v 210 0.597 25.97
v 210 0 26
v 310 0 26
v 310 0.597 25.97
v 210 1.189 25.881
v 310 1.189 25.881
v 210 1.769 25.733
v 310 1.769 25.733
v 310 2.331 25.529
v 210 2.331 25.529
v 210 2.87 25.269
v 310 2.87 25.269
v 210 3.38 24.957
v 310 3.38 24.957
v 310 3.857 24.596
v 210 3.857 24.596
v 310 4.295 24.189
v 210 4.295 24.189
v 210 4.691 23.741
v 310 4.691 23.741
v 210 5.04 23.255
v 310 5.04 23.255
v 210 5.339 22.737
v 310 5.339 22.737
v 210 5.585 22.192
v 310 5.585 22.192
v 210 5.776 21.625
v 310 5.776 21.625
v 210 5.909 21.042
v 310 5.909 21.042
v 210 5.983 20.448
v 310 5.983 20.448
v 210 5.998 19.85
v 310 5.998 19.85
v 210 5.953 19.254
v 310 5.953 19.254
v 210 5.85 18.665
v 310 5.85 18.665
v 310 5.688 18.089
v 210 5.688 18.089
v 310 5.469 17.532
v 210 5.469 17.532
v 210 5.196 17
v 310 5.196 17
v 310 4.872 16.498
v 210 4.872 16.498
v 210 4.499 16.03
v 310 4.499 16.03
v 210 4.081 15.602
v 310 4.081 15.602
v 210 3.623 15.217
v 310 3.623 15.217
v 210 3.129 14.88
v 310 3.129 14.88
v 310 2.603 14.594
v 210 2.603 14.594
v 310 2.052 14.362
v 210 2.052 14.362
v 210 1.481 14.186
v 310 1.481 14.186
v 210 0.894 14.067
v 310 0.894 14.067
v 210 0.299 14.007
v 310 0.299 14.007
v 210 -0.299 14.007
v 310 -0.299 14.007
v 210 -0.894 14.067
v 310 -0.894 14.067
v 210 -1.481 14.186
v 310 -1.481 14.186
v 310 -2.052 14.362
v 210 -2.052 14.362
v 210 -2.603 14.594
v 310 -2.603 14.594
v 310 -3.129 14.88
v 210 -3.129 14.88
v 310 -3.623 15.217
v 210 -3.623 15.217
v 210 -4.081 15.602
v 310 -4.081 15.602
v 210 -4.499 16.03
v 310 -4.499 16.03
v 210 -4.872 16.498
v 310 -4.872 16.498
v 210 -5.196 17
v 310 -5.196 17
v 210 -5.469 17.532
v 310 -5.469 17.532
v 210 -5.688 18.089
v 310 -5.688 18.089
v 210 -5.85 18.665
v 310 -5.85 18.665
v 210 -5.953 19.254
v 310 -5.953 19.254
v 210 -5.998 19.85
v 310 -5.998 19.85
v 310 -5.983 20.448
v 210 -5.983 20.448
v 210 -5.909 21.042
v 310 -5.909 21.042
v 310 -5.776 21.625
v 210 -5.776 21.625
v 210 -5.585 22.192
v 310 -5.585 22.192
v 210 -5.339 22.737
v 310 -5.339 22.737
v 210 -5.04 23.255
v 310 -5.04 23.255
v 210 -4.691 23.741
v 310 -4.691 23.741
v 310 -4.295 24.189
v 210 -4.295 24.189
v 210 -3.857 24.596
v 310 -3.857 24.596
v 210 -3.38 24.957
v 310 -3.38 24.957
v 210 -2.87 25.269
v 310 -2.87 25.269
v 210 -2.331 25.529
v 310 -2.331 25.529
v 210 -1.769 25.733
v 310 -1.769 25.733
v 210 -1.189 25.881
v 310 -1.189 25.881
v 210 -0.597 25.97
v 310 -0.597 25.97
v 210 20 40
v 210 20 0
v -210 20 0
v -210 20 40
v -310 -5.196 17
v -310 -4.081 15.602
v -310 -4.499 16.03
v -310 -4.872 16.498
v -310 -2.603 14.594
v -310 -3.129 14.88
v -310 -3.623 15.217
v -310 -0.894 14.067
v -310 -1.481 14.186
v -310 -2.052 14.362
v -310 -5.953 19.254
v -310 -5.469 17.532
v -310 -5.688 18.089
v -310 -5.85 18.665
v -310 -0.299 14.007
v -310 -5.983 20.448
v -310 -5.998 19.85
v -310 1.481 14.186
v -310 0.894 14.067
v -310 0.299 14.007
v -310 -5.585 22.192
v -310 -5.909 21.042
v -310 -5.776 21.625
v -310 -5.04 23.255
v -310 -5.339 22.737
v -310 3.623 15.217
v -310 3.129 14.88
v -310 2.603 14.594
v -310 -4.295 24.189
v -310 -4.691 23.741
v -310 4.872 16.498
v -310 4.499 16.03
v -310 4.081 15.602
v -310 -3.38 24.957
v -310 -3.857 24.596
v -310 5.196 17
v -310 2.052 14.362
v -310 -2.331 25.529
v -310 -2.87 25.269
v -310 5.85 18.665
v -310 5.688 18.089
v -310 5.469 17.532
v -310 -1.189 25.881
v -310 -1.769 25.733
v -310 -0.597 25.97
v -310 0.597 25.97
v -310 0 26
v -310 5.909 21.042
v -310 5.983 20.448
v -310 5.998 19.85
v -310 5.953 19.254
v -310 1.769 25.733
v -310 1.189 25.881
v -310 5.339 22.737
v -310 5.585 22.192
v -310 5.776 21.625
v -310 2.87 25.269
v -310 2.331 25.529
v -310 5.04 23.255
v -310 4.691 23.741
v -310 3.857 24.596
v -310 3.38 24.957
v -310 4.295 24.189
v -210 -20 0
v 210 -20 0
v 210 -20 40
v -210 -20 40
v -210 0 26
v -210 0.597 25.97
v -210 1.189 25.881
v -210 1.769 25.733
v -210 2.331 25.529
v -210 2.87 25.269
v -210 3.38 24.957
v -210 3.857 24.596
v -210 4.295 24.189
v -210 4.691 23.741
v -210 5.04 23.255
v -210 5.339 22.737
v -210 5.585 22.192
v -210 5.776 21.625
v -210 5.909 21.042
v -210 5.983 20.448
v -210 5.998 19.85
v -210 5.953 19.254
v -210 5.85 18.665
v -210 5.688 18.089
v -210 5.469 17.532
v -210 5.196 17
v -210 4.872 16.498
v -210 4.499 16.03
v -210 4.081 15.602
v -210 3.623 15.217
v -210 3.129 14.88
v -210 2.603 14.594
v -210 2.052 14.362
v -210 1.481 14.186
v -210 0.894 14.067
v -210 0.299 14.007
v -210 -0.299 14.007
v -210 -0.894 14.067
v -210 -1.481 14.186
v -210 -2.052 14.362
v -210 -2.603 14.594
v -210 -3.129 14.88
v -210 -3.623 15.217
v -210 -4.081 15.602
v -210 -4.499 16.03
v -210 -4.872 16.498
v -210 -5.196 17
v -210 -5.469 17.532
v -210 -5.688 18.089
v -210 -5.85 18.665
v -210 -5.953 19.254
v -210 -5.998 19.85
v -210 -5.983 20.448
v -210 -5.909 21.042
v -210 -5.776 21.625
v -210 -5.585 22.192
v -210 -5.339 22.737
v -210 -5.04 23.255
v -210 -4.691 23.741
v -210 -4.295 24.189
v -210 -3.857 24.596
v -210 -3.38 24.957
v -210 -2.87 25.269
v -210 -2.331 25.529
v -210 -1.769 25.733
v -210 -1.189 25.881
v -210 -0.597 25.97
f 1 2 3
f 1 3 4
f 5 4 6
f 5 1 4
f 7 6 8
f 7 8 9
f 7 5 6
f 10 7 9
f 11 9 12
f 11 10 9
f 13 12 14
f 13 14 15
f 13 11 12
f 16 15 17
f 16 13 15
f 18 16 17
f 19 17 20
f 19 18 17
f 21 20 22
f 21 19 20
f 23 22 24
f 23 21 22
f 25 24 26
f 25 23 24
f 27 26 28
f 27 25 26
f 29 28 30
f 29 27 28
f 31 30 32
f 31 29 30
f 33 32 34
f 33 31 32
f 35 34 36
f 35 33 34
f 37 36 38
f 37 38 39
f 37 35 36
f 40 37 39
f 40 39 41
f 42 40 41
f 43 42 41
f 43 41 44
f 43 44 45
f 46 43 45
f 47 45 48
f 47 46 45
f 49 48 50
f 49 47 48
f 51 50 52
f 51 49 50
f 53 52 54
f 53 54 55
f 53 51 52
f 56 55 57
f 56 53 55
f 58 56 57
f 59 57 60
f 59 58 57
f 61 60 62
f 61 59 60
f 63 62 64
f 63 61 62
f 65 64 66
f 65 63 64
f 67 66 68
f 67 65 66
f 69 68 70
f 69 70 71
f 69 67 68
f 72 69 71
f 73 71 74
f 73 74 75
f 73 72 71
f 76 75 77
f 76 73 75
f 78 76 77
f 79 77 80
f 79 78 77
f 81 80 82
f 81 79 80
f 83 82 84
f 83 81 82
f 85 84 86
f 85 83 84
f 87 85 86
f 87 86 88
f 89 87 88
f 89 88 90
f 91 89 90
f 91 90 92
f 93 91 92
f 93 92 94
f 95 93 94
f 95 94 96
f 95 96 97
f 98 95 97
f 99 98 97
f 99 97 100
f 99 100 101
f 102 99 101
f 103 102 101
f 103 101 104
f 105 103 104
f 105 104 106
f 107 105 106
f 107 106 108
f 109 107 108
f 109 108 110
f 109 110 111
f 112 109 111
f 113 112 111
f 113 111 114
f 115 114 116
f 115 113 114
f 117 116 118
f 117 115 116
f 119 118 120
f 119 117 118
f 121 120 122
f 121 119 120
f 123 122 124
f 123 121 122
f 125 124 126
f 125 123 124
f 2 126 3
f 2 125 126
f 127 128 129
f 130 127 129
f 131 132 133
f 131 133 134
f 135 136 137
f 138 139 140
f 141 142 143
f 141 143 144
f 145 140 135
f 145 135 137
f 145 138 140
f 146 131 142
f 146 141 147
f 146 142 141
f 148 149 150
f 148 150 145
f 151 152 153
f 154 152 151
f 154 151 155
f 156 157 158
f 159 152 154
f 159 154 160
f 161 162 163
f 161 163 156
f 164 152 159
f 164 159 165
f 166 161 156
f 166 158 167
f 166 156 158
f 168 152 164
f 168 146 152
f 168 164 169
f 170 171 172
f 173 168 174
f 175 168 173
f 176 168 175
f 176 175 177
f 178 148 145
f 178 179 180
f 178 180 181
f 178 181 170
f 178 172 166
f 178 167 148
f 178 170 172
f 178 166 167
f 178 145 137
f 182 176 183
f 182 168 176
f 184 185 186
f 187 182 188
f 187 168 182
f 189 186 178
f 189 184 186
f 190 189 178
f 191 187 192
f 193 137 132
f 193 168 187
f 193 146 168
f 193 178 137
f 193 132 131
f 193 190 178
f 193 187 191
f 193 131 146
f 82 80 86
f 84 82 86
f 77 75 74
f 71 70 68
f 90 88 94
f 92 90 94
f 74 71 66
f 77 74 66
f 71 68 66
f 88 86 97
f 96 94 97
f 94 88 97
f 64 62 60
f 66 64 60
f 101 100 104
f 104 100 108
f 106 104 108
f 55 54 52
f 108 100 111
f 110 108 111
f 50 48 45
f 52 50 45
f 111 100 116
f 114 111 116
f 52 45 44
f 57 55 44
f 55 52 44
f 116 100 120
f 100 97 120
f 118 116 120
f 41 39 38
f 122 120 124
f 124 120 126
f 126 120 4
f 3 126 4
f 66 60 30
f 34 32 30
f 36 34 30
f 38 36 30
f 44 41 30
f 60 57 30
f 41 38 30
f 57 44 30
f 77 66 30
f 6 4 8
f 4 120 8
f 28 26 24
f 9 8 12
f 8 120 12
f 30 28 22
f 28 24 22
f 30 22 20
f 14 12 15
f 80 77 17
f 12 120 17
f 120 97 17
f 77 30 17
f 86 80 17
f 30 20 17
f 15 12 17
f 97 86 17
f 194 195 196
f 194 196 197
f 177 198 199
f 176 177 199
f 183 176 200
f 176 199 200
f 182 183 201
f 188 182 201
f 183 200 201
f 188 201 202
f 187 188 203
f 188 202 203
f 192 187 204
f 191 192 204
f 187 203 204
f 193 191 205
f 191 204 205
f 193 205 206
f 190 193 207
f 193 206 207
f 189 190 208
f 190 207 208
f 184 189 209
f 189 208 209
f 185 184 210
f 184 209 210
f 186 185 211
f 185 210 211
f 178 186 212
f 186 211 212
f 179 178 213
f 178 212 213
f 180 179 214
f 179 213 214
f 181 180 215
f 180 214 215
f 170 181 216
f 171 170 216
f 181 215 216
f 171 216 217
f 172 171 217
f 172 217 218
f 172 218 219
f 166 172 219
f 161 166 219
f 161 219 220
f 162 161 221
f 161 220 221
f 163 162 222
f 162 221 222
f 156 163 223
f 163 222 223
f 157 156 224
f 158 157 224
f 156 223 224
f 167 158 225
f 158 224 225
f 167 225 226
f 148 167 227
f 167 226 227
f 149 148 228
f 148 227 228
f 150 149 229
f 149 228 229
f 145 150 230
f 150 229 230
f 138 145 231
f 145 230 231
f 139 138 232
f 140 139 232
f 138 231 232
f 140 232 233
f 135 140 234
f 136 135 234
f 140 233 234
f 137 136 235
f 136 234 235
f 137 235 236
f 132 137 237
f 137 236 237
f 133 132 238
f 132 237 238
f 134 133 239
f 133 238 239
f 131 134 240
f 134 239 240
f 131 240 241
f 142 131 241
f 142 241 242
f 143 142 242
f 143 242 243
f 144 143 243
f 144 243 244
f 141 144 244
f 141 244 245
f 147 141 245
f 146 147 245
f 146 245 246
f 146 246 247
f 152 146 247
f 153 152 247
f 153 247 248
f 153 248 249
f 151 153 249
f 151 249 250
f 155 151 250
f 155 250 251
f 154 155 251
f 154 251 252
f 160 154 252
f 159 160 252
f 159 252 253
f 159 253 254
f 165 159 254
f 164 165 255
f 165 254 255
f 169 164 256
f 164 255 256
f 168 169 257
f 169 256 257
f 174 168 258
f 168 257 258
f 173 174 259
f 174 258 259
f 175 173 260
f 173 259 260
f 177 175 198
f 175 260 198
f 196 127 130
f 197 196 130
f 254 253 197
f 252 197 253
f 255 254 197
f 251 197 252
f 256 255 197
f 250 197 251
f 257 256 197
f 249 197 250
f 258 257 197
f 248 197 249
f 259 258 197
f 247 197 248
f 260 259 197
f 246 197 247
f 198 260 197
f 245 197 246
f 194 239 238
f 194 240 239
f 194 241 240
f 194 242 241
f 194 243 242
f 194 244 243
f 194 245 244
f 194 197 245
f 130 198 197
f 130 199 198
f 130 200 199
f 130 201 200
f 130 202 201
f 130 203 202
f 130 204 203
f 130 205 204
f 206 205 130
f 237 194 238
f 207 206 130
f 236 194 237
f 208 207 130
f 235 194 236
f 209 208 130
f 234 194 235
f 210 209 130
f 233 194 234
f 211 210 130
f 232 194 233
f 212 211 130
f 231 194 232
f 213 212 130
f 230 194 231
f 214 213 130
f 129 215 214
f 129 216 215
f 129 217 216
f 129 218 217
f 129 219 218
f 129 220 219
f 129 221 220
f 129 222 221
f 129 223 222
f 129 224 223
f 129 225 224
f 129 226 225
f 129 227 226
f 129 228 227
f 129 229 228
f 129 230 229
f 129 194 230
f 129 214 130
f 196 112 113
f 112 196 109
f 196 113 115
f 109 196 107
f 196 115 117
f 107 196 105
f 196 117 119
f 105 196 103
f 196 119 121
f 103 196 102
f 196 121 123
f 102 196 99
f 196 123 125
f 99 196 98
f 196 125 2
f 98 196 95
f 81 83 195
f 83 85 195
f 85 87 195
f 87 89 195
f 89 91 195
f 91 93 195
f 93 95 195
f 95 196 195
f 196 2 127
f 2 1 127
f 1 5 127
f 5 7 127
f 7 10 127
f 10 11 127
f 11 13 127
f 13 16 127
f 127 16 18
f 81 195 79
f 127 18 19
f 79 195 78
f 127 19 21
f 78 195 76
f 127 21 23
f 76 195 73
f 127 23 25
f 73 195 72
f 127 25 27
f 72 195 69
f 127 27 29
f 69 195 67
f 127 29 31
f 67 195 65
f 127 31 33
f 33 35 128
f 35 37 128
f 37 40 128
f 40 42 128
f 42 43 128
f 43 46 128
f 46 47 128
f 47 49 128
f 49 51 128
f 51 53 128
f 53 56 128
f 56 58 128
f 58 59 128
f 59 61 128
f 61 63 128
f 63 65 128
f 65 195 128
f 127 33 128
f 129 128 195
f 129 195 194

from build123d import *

# Parameters (mm, degrees)
SKETCH1_W           = 210
SKETCH1_H           = 40
BOSS_EXTRUDE1_DEPTH = 40
SKETCH2_R           = 6
BOSS_EXTRUDE2_DEPTH = 100


with BuildPart() as part:
    # Sketch1 → Boss-Extrude1 (new body)
    with BuildSketch(Plane.XY):
        with Locations((-105, 0)):
            Rectangle(SKETCH1_W, SKETCH1_H)
    extrude(amount=BOSS_EXTRUDE1_DEPTH)

    # Sketch2 → Boss-Extrude2 (add)
    with BuildSketch(Plane.ZY.offset(210)):
        with Locations((20, 0)):
            Circle(SKETCH2_R)
    extrude(amount=BOSS_EXTRUDE2_DEPTH)

    # Mirror1: part across plane


with BuildPart() as part_1:
    add(part.part)
    add(part.part.mirror(Plane(origin=(0, 20, 40), x_dir=(0, 0, 1), z_dir=(-1, 0, 0))))


solid = part_1.part
